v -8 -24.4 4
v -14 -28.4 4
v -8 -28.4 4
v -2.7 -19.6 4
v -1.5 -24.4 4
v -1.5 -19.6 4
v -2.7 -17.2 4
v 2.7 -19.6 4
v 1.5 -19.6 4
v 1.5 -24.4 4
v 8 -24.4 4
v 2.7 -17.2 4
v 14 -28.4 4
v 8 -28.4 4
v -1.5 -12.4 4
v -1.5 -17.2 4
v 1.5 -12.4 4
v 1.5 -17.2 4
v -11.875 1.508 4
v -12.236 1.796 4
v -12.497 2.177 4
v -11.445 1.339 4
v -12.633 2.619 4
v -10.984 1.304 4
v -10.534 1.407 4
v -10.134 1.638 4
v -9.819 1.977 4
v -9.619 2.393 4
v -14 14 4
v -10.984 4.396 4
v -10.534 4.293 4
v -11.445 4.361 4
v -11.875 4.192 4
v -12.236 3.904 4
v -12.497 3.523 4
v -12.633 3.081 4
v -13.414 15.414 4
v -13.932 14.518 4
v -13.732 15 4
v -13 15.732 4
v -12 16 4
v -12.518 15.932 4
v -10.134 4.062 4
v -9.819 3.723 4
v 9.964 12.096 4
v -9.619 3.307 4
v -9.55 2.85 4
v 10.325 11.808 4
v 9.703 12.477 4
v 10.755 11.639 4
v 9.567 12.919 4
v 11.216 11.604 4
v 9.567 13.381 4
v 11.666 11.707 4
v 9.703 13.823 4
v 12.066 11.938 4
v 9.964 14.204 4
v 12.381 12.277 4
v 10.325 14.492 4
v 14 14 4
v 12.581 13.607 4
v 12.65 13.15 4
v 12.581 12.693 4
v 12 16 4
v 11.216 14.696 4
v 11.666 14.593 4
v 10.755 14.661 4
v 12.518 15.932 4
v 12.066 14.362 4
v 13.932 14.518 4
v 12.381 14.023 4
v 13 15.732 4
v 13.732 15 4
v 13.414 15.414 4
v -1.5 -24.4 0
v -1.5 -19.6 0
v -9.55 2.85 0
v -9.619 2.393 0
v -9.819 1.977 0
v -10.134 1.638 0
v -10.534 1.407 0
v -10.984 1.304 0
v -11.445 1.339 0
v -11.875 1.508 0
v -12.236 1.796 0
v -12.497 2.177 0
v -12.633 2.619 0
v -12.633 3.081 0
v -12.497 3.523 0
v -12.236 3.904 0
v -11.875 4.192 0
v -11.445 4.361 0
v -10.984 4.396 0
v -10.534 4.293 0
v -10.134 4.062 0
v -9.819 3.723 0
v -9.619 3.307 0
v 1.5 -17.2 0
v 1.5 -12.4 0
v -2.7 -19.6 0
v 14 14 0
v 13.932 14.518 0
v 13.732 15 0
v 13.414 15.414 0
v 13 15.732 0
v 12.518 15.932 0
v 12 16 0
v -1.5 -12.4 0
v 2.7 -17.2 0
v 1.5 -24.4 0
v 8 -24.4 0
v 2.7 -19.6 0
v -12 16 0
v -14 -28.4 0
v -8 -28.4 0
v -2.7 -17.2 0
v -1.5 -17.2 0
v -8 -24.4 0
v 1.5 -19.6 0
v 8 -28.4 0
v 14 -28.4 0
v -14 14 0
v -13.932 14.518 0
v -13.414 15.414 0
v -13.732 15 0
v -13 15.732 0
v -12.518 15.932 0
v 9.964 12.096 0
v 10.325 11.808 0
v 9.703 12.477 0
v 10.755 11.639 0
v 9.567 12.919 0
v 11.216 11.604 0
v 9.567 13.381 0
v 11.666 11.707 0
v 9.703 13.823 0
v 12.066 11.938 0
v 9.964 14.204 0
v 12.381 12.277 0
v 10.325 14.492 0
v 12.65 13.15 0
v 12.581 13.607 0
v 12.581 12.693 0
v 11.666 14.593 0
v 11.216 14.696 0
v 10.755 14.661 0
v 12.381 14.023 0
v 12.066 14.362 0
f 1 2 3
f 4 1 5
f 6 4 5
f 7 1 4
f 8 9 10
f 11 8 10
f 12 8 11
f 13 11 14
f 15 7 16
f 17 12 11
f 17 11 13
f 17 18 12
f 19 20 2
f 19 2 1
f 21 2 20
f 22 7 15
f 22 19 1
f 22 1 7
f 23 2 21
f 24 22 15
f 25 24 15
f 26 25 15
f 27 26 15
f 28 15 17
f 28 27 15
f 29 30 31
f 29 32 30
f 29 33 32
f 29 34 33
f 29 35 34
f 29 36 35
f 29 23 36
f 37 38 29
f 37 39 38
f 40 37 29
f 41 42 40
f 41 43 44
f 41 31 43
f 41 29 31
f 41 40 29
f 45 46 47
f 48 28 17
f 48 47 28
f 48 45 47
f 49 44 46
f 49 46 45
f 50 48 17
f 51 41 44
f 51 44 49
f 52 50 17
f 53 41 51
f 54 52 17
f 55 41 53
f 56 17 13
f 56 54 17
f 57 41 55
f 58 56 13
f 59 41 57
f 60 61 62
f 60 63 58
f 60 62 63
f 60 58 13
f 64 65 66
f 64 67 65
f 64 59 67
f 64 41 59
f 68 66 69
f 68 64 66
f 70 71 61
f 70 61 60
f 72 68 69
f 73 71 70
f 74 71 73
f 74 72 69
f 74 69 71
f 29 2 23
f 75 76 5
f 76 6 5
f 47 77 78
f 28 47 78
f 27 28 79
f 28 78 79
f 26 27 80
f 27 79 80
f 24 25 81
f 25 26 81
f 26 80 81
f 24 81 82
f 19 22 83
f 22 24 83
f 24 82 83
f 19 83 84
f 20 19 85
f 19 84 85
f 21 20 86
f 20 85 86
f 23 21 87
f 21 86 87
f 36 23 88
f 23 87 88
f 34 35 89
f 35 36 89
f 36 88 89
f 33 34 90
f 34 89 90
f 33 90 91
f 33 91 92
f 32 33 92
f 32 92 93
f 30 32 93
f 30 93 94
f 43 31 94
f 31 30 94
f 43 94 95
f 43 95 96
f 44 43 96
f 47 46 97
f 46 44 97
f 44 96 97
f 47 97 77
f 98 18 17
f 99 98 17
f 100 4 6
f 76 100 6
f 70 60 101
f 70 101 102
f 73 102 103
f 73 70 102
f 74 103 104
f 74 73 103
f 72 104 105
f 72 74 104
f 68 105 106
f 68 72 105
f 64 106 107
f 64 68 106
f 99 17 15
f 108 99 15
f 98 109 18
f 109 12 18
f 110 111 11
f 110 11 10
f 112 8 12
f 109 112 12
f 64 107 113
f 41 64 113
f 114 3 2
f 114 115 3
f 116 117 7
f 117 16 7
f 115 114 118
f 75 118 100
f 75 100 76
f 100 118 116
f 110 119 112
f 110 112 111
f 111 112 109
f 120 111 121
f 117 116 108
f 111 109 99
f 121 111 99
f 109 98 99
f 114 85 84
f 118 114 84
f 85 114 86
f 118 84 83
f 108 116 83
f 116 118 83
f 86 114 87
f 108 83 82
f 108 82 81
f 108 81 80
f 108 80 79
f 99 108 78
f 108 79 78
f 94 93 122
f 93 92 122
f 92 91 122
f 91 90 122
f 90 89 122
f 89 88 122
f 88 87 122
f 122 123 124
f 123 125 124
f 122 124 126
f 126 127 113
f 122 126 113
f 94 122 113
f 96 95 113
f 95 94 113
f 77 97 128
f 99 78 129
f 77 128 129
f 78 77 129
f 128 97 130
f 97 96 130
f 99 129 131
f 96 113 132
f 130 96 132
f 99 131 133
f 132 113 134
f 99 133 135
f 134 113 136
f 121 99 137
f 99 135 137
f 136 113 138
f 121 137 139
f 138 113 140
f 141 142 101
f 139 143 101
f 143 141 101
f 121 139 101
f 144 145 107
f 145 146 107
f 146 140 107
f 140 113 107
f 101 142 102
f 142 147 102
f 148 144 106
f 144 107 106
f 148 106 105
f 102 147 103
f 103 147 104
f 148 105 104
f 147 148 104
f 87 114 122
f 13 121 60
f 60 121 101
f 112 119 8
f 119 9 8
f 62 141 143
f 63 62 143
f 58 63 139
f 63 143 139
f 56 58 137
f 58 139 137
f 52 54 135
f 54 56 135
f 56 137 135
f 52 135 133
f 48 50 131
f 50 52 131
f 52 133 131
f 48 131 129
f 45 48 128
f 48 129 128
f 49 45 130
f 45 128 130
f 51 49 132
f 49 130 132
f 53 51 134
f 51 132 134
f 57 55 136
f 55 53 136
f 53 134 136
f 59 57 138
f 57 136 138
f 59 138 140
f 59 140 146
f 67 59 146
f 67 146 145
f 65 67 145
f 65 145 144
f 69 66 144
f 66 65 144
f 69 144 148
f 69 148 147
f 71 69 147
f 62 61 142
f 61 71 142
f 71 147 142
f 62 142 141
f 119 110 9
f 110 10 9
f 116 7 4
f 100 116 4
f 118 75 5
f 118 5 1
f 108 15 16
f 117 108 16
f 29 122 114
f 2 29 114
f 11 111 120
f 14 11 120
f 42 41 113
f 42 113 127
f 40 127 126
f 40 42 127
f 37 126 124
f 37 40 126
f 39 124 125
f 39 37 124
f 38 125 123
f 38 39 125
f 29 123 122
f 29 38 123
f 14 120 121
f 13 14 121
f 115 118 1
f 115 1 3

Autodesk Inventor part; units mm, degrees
ref_plane "YZ Plane" through (0, 0, 0) normal (1, 0, 0) x (0, 1, 0)
ref_plane "XZ Plane" through (0, 0, 0) normal (0, 1, 0) x (-1, 0, 0)
ref_plane "XY Plane" through (0, 0, 0) normal (0, 0, 1) x (1, 0, 0)
sketch "Sketch1" plane through (0, 0, 0) normal (0, 0, 1) x (1, 0, 0)
  line L0 (-14, 0) -> (14, 0)
  line L1 (14, 0) -> (14, 16)
  line L2 (14, 16) -> (-14, 16)
  line L3 (-14, 16) -> (-14, 0)
  circle A0 centre (-11.1, 2.85) radius 1.55
  circle A1 centre (11.1, 13.15) radius 1.55
  line L4 (-11.1, 2.85) -> (-14, 2.85) construction
  line L5 (11.1, 13.15) -> (14, 13.15) construction
  line L6 (11.1, 13.15) -> (11.1, 16) construction
  line L7 (-11.1, 2.85) -> (-11.1, 0) construction
  line L8 (-14, 0) -> (14, 0) construction
  line L9 (14, 0) -> (14, -24.4)
  line L10 (14, -24.4) -> (8, -24.4) construction
  line L11 (-14, -24.4) -> (-14, 0)
  line L12 (-14, -24.4) -> (-8, -24.4) construction
  line L13 (-8, -24.4) -> (-8, -28.4)
  line L14 (-8, -28.4) -> (-14, -28.4)
  line L15 (-14, -28.4) -> (-14, -24.4)
  line L16 (14, -24.4) -> (8, -24.4) construction
  line L17 (8, -24.4) -> (8, -28.4)
  line L18 (8, -28.4) -> (14, -28.4)
  line L19 (14, -28.4) -> (14, -24.4)
  line L20 (-8, -24.4) -> (-14, -24.4) construction
  line L21 (8, -24.4) -> (-8, -24.4)
  point P0 (0, 0)
  point P1 (0, 0)
  point P2 (14, 0)
  point P3 (14, 0)
  dimension "d0" = 3.1
  dimension "d1" = 22.2
  dimension "d2" = 10.3
  dimension "d3" = 16
  dimension "d4" = 28
  dimension "d5" = 40.4
  dimension "d8" = 6
  dimension "d9" = 6
  dimension "d10" = 4
extrude "Extrusion1" add sketch "Sketch1" along normal blind 4
sketch "Sketch2" plane through (0, 0, 4) normal (0, 0, 1) x (1, 0, 0)
  line L0 (14, -28.4) -> (14, 16) construction
  line L1 (14, 16) -> (-14, 16) construction
  line L2 (-14, 16) -> (-14, -28.4) construction
  line L3 (-14, -28.4) -> (-8, -28.4) construction
  line L4 (-8, -28.4) -> (-8, -24.4) construction
  line L5 (-8, -24.4) -> (8, -24.4) construction
  line L6 (8, -24.4) -> (8, -28.4) construction
  line L7 (8, -28.4) -> (14, -28.4) construction
  circle A0 centre (-11.1, 2.85) radius 1.55 construction
  circle A1 centre (11.1, 13.15) radius 1.55 construction
  line L8 (-1.5, -24.4) -> (1.5, -24.4)
  line L9 (1.5, -24.4) -> (1.5, -12.4)
  line L10 (1.5, -12.4) -> (-1.5, -12.4)
  line L11 (-1.5, -12.4) -> (-1.5, -24.4)
  line L12 (-2.7, -19.6) -> (2.7, -19.6)
  line L13 (2.7, -19.6) -> (2.7, -17.2)
  line L14 (2.7, -17.2) -> (-2.7, -17.2)
  line L15 (-2.7, -17.2) -> (-2.7, -19.6)
  point P0 (0, 0)
  point P1 (-2.7, -18.4)
  point P2 (-1.5, -18.4)
  point P3 (0, -17.2)
  point P4 (0, -12.4)
  point P5 (0, -24.4)
  point P6 (0, -24.4)
  point P7 (-1.5, -19.6)
  point P8 (1.5, -19.6)
  point P9 (1.5, -17.2)
  point P10 (-1.5, -17.2)
  dimension "d11" = 3
  dimension "d12" = 2.4
  dimension "d13" = 5.4
  dimension "d14" = 12
extrude "Extrusion2" cut sketch "Sketch2" against normal up to next
fillet "Fillet1" radius 2 2 edges at (14, 16, 2) (-14, 16, 2)
properties part number "SwitchHolder_Bottom_V3" material "MDF Medium Density Fiberboard"
